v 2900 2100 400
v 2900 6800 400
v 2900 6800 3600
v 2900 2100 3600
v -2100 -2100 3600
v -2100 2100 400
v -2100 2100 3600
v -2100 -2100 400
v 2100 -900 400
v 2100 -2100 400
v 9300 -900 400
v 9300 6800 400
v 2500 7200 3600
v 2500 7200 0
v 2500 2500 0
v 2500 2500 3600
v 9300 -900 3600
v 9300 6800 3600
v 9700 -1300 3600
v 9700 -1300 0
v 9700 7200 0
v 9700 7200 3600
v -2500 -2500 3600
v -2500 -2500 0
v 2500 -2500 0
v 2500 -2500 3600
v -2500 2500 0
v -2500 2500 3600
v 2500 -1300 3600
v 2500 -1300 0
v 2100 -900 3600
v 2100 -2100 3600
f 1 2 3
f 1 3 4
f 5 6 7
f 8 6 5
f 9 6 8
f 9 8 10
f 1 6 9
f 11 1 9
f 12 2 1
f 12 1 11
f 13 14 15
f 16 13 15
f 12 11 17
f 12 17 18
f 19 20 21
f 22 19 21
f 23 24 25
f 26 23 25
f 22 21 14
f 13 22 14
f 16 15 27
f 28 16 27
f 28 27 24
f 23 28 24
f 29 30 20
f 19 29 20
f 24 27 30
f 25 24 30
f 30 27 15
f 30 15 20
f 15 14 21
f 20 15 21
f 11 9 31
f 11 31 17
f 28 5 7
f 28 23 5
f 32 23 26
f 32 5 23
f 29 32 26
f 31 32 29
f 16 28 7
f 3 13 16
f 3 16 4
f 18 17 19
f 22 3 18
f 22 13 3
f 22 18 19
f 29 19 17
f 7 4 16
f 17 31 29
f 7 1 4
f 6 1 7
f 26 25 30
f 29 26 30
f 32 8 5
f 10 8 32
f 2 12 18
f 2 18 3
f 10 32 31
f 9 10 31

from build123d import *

# Parameters (mm, degrees)
F1_DEPTH = 3600
F2_T     = -400


with BuildPart() as f1:
    # F0 (on Top) → F1 (new body)
    with BuildSketch(Plane.XY):
        Polygon((2500, 2500), (-2500, 2500), (-2500, -2500), (2500, -2500), (2500, -1300), (9700, -1300), (9700, 7200), (2500, 7200), align=None)
    extrude(amount=F1_DEPTH)

    # F2
    f2_openings = [f1.faces().sort_by_distance(p)[0] for p in [
        (4330.858469, 2094.431555, 3600),
    ]]
    offset(amount=F2_T, openings=f2_openings, kind=Kind.INTERSECTION)


solid = f1.part
